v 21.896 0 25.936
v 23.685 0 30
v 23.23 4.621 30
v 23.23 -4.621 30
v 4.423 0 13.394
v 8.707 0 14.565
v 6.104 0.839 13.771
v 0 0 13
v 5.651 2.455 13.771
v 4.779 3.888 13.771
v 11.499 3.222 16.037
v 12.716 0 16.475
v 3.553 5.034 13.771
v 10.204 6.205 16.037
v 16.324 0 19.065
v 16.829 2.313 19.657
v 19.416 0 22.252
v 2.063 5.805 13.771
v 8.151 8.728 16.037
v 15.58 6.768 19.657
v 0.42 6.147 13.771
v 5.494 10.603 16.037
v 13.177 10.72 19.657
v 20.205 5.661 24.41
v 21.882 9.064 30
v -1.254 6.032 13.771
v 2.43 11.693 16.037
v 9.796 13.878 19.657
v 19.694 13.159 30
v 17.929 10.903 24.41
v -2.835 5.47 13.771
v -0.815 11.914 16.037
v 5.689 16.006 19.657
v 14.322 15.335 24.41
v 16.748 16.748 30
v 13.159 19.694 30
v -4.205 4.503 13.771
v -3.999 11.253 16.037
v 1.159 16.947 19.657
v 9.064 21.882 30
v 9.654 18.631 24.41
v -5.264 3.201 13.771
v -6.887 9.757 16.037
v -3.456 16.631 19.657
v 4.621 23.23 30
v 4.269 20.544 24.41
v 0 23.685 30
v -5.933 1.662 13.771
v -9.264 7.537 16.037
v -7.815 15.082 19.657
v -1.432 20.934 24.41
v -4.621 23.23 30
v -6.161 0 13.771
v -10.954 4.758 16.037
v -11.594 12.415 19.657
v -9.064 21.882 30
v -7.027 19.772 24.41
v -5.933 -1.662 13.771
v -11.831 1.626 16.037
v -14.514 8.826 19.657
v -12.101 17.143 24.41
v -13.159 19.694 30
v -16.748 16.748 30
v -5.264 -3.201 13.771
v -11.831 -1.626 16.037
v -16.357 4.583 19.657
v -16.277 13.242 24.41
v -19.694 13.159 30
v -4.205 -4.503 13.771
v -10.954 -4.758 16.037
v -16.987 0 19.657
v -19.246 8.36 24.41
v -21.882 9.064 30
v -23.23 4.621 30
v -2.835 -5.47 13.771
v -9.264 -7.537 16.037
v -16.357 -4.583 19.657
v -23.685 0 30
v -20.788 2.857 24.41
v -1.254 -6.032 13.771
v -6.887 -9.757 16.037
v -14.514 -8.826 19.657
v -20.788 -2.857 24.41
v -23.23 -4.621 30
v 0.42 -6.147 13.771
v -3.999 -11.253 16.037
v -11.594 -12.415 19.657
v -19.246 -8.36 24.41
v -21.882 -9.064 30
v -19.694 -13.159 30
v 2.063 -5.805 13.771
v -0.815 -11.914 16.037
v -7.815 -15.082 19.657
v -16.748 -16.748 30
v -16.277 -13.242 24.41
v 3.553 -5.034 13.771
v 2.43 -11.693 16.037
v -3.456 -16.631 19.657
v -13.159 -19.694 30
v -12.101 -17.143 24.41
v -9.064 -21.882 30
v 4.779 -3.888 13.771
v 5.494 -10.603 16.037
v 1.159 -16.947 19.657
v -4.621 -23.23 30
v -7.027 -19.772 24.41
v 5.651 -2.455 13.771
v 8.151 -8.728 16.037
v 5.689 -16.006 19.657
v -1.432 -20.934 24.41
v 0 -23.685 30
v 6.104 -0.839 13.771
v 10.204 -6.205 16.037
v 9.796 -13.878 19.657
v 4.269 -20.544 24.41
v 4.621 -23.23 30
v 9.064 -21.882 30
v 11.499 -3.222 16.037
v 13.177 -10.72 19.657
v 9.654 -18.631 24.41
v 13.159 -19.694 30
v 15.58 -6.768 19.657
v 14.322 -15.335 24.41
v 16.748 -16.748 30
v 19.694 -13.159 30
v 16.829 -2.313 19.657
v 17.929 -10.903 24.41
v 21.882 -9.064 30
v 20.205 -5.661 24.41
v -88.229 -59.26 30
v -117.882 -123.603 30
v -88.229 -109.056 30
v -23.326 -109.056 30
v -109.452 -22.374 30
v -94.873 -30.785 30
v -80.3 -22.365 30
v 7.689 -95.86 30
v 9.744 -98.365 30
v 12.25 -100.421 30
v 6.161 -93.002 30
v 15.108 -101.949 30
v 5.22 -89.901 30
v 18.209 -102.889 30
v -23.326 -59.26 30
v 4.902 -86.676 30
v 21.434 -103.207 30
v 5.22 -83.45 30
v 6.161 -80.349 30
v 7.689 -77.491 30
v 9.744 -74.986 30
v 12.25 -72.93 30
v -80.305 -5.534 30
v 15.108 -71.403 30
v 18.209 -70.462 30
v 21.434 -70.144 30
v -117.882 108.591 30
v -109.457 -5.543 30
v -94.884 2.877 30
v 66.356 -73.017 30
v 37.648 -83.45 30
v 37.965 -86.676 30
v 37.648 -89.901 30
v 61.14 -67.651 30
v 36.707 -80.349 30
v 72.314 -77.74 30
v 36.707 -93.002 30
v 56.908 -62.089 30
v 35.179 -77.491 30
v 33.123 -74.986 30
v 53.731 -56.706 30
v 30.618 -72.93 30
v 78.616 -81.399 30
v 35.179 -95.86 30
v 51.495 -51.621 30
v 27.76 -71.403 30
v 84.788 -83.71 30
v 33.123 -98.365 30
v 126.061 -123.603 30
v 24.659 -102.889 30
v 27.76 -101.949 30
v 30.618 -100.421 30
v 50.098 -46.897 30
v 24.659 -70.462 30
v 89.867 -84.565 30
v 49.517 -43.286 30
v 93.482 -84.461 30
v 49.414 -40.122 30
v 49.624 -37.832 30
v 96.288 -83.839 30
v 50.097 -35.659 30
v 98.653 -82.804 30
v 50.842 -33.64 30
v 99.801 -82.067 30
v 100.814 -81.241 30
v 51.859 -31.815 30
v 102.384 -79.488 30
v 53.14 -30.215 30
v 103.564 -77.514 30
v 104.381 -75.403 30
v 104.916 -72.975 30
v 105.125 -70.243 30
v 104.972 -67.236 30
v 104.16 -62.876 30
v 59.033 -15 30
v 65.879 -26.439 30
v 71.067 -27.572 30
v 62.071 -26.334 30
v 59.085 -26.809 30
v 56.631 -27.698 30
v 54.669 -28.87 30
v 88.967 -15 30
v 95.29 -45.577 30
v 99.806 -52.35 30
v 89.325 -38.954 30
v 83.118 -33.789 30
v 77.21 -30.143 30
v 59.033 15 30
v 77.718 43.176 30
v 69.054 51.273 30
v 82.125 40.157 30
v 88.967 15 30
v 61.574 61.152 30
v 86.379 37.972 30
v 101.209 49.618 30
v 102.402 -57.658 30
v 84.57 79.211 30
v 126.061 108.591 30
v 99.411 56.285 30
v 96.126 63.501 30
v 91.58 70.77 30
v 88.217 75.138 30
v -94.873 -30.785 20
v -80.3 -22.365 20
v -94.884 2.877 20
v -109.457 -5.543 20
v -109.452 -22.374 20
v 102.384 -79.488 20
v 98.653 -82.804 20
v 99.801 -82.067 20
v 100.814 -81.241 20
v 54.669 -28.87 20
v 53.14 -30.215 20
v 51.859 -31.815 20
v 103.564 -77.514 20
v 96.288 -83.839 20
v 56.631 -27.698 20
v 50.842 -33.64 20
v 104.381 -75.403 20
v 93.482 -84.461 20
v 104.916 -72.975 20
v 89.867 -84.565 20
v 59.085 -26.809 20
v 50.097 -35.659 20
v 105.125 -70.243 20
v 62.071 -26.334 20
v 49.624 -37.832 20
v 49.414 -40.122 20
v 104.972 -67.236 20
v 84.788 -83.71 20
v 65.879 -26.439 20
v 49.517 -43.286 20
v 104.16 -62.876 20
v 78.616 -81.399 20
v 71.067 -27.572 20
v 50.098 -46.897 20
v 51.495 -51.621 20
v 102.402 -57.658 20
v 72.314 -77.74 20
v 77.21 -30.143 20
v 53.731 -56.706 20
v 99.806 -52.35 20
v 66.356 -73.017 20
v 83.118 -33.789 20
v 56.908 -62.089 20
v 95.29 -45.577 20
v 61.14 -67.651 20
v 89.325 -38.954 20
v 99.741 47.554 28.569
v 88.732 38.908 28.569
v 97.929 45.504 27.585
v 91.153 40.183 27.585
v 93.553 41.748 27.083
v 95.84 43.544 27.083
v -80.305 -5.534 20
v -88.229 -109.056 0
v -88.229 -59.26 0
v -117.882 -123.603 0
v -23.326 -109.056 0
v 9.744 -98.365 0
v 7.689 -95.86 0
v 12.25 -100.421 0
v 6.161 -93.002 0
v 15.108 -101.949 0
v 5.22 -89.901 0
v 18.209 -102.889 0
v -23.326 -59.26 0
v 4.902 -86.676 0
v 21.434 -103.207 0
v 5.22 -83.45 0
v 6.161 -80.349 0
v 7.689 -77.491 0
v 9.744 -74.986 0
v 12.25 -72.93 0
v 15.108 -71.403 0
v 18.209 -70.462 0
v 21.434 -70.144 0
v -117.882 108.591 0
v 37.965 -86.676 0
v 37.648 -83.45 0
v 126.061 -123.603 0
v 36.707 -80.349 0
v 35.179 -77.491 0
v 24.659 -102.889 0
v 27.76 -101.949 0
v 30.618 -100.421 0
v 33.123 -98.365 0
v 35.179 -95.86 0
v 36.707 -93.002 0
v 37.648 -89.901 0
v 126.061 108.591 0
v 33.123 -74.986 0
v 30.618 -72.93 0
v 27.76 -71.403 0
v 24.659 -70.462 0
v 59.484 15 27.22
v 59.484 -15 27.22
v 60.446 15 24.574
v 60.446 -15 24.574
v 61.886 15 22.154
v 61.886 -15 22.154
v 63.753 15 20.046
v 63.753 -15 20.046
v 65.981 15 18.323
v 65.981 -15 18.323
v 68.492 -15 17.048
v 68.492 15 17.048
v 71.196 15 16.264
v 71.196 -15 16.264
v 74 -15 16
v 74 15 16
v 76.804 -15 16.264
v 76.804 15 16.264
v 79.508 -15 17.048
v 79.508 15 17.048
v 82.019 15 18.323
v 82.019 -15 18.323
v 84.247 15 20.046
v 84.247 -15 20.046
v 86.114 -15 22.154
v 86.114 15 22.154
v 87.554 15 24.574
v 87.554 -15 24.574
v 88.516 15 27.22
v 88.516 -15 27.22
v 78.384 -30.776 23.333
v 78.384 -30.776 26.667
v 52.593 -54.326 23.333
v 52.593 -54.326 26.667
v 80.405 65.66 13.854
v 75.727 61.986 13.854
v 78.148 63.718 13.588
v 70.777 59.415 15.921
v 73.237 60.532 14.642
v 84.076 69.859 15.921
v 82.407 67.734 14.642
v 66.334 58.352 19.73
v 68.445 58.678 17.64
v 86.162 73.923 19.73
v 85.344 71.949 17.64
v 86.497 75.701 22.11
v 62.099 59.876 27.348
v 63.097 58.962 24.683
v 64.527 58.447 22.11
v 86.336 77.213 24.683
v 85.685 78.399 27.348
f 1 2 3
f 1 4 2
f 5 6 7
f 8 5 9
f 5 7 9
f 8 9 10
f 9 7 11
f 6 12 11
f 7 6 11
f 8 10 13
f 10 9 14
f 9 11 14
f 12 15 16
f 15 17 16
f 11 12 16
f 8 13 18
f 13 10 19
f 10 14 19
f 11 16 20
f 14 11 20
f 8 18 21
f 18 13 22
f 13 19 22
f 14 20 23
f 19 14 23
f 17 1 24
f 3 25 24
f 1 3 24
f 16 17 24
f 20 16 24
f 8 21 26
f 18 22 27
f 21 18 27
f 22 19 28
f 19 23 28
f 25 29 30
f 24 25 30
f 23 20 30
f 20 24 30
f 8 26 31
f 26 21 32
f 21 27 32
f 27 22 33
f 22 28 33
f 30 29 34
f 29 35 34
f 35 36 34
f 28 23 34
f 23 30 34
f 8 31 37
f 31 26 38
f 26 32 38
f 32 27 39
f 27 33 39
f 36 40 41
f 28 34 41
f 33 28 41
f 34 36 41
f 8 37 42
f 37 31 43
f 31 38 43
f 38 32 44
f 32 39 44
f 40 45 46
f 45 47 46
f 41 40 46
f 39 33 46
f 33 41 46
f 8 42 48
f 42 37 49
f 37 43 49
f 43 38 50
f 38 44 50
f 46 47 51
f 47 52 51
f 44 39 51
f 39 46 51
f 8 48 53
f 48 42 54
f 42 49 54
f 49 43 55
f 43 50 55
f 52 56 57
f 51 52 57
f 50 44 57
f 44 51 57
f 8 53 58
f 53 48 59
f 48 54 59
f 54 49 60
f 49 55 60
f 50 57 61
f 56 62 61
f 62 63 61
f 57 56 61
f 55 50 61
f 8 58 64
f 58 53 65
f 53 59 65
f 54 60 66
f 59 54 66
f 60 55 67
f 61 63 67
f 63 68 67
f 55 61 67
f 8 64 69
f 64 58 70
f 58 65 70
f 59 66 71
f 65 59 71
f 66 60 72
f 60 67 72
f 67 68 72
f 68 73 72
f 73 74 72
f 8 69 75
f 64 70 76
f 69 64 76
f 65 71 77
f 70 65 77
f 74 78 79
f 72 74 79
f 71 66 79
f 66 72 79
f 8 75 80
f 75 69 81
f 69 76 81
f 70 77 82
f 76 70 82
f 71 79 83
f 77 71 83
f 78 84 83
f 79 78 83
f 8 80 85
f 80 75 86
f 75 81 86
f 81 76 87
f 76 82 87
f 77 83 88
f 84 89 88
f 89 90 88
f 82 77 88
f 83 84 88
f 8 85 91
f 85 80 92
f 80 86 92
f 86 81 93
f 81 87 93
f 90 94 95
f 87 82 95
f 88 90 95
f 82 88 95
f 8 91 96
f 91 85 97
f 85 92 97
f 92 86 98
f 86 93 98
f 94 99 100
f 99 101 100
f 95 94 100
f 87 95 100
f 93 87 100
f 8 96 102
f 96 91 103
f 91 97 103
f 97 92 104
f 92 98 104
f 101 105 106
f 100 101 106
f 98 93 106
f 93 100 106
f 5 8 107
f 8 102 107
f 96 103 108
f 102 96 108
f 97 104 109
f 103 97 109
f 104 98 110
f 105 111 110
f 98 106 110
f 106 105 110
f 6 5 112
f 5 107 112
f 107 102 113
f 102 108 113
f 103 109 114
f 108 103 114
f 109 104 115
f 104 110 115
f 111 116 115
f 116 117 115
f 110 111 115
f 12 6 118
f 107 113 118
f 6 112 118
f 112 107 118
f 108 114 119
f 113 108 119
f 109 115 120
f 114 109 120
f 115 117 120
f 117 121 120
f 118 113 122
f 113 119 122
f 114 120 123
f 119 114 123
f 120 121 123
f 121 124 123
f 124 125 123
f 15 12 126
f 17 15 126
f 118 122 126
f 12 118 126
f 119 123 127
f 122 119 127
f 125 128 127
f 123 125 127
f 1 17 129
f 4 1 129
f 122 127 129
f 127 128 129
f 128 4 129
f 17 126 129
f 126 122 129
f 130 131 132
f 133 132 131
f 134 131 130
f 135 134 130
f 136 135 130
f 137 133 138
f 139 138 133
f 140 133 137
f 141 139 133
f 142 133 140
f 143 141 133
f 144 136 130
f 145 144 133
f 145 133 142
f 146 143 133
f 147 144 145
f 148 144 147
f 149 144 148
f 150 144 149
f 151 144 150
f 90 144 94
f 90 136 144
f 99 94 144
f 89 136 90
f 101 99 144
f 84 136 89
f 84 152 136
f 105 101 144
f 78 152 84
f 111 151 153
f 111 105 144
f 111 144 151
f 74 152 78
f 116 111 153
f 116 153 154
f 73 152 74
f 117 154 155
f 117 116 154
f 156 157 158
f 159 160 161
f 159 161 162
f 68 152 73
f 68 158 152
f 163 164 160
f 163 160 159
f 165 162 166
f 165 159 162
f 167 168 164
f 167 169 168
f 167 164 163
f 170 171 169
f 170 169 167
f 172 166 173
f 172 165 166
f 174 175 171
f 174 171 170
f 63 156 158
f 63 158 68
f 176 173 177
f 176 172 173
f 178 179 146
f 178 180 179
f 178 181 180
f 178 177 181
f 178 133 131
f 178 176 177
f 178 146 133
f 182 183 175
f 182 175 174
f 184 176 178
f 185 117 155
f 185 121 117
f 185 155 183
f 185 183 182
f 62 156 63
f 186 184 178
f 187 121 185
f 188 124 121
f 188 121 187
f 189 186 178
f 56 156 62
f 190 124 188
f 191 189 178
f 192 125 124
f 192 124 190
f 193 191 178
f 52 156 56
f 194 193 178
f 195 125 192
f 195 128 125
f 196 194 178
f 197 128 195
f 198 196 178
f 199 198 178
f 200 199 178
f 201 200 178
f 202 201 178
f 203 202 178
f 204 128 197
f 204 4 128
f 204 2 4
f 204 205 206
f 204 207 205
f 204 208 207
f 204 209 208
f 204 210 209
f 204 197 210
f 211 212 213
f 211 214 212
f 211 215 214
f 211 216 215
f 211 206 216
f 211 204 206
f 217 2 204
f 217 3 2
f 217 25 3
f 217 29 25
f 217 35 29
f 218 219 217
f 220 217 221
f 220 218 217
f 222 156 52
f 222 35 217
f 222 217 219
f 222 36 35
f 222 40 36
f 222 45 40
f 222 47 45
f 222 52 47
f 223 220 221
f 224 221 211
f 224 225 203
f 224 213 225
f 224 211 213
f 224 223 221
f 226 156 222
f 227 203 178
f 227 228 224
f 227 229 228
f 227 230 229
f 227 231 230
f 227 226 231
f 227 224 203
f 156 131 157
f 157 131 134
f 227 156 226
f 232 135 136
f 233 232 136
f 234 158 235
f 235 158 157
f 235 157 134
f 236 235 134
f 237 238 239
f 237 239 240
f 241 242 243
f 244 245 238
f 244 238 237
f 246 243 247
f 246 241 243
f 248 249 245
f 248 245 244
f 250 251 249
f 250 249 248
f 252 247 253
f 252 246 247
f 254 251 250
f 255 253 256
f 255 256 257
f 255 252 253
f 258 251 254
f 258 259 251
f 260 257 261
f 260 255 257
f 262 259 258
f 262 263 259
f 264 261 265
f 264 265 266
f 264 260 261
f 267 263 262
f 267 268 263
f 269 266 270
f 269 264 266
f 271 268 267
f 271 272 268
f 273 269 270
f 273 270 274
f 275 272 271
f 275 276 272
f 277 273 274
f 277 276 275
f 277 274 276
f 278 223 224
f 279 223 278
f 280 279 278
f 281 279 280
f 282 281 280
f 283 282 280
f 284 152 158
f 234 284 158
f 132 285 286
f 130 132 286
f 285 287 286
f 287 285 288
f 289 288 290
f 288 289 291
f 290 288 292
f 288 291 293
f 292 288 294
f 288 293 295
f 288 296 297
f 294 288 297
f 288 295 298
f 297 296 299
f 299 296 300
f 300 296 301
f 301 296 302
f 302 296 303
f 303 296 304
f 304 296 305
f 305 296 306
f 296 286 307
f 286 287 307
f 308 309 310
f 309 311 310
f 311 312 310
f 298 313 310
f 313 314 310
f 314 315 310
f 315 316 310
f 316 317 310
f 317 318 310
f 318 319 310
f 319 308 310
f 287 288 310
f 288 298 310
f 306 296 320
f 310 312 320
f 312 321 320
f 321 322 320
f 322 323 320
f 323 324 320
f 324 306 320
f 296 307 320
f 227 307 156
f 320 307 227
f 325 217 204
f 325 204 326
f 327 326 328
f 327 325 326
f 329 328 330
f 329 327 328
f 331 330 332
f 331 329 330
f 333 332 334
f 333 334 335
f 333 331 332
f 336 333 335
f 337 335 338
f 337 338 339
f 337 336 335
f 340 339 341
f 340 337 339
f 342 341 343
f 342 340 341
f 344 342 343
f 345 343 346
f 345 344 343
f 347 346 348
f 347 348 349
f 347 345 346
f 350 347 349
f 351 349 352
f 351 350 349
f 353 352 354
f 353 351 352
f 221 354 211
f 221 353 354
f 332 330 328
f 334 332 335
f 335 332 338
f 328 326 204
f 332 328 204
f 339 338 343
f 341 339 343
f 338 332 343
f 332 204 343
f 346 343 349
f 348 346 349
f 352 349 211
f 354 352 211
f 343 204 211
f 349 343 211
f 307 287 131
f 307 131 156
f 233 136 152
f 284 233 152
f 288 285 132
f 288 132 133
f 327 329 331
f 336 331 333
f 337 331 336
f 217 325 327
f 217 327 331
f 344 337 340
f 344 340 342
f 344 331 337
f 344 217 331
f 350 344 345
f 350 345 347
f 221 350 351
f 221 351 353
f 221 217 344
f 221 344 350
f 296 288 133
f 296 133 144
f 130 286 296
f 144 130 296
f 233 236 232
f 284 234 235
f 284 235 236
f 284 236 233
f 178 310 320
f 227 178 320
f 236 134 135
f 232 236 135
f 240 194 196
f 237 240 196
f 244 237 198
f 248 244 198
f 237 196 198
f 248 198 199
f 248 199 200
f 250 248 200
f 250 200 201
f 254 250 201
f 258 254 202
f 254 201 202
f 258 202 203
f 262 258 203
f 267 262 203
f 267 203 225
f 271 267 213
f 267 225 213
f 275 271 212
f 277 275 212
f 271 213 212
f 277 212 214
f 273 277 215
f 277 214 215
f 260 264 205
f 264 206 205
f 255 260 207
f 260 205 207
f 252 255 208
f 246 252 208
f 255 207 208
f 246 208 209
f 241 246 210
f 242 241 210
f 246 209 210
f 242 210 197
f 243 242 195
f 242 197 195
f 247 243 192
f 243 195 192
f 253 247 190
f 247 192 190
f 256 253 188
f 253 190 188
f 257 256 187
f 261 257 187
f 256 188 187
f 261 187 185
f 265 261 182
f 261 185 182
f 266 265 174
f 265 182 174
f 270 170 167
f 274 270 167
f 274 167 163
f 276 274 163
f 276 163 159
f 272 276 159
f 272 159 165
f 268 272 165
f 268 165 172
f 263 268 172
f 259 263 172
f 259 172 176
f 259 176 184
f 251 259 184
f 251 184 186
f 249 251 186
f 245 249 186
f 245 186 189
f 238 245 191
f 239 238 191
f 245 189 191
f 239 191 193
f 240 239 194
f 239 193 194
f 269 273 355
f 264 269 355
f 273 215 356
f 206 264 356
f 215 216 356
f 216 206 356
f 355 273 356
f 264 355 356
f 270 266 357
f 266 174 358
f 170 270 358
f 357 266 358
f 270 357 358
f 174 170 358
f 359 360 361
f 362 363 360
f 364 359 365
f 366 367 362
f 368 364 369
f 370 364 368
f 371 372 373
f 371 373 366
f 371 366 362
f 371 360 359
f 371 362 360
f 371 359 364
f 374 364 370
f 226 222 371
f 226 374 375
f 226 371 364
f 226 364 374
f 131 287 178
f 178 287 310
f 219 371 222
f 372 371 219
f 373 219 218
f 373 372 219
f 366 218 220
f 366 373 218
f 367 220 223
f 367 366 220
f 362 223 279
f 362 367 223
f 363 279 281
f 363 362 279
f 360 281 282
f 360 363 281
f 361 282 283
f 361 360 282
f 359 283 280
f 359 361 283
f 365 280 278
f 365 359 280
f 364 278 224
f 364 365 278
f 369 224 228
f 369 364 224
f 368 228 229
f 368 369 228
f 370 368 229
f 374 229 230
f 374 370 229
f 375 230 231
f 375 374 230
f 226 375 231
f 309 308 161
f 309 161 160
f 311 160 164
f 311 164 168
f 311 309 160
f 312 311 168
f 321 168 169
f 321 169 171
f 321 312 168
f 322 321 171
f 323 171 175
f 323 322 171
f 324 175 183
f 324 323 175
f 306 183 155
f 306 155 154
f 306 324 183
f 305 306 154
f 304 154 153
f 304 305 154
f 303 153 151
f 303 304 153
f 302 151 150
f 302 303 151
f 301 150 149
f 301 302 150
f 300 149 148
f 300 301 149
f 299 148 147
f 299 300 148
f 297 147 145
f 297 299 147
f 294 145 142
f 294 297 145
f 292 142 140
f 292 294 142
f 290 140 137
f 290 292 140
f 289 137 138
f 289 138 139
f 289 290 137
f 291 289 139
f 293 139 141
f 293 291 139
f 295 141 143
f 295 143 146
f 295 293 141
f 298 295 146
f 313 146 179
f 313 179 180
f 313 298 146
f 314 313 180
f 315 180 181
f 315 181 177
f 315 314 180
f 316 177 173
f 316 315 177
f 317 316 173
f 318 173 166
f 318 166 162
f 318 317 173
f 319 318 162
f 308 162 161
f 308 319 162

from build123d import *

# Parameters (mm, degrees)
CYLINDER001_R               = 15
CYLINDER001_DEPTH           = 30
CYLINDER001_ROLL_ANGLE      = 57.515834
CYLINDER001_PITCH_ANGLE     = -33.522488
CYLINDER001_PLACEMENT_ANGLE = 57.515834
CYLINDER_R                  = 15
CYLINDER_DEPTH              = 30
SKETCH_W                    = 243.943557
SKETCH_H                    = 232.19397
SKETCH_R                    = 16.531402
SKETCH_W_2                  = 64.902409
SKETCH_H_2                  = 49.795826
PAD_DEPTH                   = 30
POCKET_DEPTH                = 10


with BuildPart() as cylinder001:
    # Cylinder001 → Cylinder001 (new body)
    with BuildSketch(Plane.XY):
        Circle(CYLINDER001_R)
    extrude(amount=CYLINDER001_DEPTH)


with BuildPart() as cylinder001_1:
    # Cylinder001 roll: moved
    add(cylinder001.part.rotate(Axis((0, 0, 0), (1, 0, 0)), CYLINDER001_ROLL_ANGLE))


with BuildPart() as cylinder001_2:
    # Cylinder001 pitch: moved
    add(cylinder001_1.part.rotate(Axis((0, 0, 0), (0, 1, 0)), CYLINDER001_PITCH_ANGLE))


with BuildPart() as cylinder001_3:
    # Cylinder001 placement: moved
    add(cylinder001_2.part.moved(Location((74, 69, 27))).rotate(Axis((74, 69, 27), (0, 0, 1)), CYLINDER001_PLACEMENT_ANGLE))


with BuildPart() as cylinder:
    # Cylinder → Cylinder (new body)
    with BuildSketch(Plane(origin=(74, 15, 31), x_dir=(1, 0, 0), z_dir=(0, -1, 0))):
        Circle(CYLINDER_R)
    extrude(amount=CYLINDER_DEPTH)


with BuildPart() as sphere:
    # Sphere → Sphere (revolve)
    with BuildSketch(Plane(origin=(0, 0, 38), x_dir=(1, 0, 0), z_dir=(0, -1, 0))):
        with BuildLine():
            ThreePointArc((0, -25), (25, 0), (0, 25))
            Line((0, 25), (0, -25))
        make_face()
    revolve(axis=Axis((0, 0, 38), (0, 0, 1)))


with BuildPart() as cut002:
    # Sketch → Pad (new body)
    with BuildSketch(Plane.XY):
        with Locations((4.089295, -7.505798)):
            Rectangle(SKETCH_W, SKETCH_H)
        with Locations((21.433901, -86.675552)):
            Circle(SKETCH_R, mode=Mode.SUBTRACT)
        with Locations((-55.777578, -84.157782)):
            Rectangle(SKETCH_W_2, SKETCH_H_2, mode=Mode.SUBTRACT)
    extrude(amount=PAD_DEPTH)

    # Sketch001 (on Face11 of Pad) → Pocket (cut)
    with BuildSketch(Plane.XY.offset(30)):
        Polygon((-80.299553, -22.364969), (-80.304949, -5.533931), (-94.883753, 2.876915), (-109.457161, -5.543277), (-109.451765, -22.374315), (-94.872961, -30.785161), align=None)
        with BuildLine():
            add(Edge.make_bspline(
                [(100.814049, -81.240913), (126.605952, -57.691792), (78.384447, -30.776448), (30.162942, -3.861103), (52.592544, -54.325568), (75.022146, -104.790034), (100.814049, -81.240913)],
                knots=[0, 0, 0, 2.094395, 2.094395, 4.18879, 4.18879, 6.283185, 6.283185, 6.283185], degree=2, weights=[1, 0.5, 1, 0.5, 1, 0.5, 1]))
        make_face()
    extrude(amount=-POCKET_DEPTH, mode=Mode.SUBTRACT)

    # Cut: cut Sphere
    add(sphere.part, mode=Mode.SUBTRACT)

    # Cut001: cut Cylinder
    add(cylinder.part, mode=Mode.SUBTRACT)

    # Cut002: cut Cylinder001
    add(cylinder001_3.part, mode=Mode.SUBTRACT)


solid = cut002.part
